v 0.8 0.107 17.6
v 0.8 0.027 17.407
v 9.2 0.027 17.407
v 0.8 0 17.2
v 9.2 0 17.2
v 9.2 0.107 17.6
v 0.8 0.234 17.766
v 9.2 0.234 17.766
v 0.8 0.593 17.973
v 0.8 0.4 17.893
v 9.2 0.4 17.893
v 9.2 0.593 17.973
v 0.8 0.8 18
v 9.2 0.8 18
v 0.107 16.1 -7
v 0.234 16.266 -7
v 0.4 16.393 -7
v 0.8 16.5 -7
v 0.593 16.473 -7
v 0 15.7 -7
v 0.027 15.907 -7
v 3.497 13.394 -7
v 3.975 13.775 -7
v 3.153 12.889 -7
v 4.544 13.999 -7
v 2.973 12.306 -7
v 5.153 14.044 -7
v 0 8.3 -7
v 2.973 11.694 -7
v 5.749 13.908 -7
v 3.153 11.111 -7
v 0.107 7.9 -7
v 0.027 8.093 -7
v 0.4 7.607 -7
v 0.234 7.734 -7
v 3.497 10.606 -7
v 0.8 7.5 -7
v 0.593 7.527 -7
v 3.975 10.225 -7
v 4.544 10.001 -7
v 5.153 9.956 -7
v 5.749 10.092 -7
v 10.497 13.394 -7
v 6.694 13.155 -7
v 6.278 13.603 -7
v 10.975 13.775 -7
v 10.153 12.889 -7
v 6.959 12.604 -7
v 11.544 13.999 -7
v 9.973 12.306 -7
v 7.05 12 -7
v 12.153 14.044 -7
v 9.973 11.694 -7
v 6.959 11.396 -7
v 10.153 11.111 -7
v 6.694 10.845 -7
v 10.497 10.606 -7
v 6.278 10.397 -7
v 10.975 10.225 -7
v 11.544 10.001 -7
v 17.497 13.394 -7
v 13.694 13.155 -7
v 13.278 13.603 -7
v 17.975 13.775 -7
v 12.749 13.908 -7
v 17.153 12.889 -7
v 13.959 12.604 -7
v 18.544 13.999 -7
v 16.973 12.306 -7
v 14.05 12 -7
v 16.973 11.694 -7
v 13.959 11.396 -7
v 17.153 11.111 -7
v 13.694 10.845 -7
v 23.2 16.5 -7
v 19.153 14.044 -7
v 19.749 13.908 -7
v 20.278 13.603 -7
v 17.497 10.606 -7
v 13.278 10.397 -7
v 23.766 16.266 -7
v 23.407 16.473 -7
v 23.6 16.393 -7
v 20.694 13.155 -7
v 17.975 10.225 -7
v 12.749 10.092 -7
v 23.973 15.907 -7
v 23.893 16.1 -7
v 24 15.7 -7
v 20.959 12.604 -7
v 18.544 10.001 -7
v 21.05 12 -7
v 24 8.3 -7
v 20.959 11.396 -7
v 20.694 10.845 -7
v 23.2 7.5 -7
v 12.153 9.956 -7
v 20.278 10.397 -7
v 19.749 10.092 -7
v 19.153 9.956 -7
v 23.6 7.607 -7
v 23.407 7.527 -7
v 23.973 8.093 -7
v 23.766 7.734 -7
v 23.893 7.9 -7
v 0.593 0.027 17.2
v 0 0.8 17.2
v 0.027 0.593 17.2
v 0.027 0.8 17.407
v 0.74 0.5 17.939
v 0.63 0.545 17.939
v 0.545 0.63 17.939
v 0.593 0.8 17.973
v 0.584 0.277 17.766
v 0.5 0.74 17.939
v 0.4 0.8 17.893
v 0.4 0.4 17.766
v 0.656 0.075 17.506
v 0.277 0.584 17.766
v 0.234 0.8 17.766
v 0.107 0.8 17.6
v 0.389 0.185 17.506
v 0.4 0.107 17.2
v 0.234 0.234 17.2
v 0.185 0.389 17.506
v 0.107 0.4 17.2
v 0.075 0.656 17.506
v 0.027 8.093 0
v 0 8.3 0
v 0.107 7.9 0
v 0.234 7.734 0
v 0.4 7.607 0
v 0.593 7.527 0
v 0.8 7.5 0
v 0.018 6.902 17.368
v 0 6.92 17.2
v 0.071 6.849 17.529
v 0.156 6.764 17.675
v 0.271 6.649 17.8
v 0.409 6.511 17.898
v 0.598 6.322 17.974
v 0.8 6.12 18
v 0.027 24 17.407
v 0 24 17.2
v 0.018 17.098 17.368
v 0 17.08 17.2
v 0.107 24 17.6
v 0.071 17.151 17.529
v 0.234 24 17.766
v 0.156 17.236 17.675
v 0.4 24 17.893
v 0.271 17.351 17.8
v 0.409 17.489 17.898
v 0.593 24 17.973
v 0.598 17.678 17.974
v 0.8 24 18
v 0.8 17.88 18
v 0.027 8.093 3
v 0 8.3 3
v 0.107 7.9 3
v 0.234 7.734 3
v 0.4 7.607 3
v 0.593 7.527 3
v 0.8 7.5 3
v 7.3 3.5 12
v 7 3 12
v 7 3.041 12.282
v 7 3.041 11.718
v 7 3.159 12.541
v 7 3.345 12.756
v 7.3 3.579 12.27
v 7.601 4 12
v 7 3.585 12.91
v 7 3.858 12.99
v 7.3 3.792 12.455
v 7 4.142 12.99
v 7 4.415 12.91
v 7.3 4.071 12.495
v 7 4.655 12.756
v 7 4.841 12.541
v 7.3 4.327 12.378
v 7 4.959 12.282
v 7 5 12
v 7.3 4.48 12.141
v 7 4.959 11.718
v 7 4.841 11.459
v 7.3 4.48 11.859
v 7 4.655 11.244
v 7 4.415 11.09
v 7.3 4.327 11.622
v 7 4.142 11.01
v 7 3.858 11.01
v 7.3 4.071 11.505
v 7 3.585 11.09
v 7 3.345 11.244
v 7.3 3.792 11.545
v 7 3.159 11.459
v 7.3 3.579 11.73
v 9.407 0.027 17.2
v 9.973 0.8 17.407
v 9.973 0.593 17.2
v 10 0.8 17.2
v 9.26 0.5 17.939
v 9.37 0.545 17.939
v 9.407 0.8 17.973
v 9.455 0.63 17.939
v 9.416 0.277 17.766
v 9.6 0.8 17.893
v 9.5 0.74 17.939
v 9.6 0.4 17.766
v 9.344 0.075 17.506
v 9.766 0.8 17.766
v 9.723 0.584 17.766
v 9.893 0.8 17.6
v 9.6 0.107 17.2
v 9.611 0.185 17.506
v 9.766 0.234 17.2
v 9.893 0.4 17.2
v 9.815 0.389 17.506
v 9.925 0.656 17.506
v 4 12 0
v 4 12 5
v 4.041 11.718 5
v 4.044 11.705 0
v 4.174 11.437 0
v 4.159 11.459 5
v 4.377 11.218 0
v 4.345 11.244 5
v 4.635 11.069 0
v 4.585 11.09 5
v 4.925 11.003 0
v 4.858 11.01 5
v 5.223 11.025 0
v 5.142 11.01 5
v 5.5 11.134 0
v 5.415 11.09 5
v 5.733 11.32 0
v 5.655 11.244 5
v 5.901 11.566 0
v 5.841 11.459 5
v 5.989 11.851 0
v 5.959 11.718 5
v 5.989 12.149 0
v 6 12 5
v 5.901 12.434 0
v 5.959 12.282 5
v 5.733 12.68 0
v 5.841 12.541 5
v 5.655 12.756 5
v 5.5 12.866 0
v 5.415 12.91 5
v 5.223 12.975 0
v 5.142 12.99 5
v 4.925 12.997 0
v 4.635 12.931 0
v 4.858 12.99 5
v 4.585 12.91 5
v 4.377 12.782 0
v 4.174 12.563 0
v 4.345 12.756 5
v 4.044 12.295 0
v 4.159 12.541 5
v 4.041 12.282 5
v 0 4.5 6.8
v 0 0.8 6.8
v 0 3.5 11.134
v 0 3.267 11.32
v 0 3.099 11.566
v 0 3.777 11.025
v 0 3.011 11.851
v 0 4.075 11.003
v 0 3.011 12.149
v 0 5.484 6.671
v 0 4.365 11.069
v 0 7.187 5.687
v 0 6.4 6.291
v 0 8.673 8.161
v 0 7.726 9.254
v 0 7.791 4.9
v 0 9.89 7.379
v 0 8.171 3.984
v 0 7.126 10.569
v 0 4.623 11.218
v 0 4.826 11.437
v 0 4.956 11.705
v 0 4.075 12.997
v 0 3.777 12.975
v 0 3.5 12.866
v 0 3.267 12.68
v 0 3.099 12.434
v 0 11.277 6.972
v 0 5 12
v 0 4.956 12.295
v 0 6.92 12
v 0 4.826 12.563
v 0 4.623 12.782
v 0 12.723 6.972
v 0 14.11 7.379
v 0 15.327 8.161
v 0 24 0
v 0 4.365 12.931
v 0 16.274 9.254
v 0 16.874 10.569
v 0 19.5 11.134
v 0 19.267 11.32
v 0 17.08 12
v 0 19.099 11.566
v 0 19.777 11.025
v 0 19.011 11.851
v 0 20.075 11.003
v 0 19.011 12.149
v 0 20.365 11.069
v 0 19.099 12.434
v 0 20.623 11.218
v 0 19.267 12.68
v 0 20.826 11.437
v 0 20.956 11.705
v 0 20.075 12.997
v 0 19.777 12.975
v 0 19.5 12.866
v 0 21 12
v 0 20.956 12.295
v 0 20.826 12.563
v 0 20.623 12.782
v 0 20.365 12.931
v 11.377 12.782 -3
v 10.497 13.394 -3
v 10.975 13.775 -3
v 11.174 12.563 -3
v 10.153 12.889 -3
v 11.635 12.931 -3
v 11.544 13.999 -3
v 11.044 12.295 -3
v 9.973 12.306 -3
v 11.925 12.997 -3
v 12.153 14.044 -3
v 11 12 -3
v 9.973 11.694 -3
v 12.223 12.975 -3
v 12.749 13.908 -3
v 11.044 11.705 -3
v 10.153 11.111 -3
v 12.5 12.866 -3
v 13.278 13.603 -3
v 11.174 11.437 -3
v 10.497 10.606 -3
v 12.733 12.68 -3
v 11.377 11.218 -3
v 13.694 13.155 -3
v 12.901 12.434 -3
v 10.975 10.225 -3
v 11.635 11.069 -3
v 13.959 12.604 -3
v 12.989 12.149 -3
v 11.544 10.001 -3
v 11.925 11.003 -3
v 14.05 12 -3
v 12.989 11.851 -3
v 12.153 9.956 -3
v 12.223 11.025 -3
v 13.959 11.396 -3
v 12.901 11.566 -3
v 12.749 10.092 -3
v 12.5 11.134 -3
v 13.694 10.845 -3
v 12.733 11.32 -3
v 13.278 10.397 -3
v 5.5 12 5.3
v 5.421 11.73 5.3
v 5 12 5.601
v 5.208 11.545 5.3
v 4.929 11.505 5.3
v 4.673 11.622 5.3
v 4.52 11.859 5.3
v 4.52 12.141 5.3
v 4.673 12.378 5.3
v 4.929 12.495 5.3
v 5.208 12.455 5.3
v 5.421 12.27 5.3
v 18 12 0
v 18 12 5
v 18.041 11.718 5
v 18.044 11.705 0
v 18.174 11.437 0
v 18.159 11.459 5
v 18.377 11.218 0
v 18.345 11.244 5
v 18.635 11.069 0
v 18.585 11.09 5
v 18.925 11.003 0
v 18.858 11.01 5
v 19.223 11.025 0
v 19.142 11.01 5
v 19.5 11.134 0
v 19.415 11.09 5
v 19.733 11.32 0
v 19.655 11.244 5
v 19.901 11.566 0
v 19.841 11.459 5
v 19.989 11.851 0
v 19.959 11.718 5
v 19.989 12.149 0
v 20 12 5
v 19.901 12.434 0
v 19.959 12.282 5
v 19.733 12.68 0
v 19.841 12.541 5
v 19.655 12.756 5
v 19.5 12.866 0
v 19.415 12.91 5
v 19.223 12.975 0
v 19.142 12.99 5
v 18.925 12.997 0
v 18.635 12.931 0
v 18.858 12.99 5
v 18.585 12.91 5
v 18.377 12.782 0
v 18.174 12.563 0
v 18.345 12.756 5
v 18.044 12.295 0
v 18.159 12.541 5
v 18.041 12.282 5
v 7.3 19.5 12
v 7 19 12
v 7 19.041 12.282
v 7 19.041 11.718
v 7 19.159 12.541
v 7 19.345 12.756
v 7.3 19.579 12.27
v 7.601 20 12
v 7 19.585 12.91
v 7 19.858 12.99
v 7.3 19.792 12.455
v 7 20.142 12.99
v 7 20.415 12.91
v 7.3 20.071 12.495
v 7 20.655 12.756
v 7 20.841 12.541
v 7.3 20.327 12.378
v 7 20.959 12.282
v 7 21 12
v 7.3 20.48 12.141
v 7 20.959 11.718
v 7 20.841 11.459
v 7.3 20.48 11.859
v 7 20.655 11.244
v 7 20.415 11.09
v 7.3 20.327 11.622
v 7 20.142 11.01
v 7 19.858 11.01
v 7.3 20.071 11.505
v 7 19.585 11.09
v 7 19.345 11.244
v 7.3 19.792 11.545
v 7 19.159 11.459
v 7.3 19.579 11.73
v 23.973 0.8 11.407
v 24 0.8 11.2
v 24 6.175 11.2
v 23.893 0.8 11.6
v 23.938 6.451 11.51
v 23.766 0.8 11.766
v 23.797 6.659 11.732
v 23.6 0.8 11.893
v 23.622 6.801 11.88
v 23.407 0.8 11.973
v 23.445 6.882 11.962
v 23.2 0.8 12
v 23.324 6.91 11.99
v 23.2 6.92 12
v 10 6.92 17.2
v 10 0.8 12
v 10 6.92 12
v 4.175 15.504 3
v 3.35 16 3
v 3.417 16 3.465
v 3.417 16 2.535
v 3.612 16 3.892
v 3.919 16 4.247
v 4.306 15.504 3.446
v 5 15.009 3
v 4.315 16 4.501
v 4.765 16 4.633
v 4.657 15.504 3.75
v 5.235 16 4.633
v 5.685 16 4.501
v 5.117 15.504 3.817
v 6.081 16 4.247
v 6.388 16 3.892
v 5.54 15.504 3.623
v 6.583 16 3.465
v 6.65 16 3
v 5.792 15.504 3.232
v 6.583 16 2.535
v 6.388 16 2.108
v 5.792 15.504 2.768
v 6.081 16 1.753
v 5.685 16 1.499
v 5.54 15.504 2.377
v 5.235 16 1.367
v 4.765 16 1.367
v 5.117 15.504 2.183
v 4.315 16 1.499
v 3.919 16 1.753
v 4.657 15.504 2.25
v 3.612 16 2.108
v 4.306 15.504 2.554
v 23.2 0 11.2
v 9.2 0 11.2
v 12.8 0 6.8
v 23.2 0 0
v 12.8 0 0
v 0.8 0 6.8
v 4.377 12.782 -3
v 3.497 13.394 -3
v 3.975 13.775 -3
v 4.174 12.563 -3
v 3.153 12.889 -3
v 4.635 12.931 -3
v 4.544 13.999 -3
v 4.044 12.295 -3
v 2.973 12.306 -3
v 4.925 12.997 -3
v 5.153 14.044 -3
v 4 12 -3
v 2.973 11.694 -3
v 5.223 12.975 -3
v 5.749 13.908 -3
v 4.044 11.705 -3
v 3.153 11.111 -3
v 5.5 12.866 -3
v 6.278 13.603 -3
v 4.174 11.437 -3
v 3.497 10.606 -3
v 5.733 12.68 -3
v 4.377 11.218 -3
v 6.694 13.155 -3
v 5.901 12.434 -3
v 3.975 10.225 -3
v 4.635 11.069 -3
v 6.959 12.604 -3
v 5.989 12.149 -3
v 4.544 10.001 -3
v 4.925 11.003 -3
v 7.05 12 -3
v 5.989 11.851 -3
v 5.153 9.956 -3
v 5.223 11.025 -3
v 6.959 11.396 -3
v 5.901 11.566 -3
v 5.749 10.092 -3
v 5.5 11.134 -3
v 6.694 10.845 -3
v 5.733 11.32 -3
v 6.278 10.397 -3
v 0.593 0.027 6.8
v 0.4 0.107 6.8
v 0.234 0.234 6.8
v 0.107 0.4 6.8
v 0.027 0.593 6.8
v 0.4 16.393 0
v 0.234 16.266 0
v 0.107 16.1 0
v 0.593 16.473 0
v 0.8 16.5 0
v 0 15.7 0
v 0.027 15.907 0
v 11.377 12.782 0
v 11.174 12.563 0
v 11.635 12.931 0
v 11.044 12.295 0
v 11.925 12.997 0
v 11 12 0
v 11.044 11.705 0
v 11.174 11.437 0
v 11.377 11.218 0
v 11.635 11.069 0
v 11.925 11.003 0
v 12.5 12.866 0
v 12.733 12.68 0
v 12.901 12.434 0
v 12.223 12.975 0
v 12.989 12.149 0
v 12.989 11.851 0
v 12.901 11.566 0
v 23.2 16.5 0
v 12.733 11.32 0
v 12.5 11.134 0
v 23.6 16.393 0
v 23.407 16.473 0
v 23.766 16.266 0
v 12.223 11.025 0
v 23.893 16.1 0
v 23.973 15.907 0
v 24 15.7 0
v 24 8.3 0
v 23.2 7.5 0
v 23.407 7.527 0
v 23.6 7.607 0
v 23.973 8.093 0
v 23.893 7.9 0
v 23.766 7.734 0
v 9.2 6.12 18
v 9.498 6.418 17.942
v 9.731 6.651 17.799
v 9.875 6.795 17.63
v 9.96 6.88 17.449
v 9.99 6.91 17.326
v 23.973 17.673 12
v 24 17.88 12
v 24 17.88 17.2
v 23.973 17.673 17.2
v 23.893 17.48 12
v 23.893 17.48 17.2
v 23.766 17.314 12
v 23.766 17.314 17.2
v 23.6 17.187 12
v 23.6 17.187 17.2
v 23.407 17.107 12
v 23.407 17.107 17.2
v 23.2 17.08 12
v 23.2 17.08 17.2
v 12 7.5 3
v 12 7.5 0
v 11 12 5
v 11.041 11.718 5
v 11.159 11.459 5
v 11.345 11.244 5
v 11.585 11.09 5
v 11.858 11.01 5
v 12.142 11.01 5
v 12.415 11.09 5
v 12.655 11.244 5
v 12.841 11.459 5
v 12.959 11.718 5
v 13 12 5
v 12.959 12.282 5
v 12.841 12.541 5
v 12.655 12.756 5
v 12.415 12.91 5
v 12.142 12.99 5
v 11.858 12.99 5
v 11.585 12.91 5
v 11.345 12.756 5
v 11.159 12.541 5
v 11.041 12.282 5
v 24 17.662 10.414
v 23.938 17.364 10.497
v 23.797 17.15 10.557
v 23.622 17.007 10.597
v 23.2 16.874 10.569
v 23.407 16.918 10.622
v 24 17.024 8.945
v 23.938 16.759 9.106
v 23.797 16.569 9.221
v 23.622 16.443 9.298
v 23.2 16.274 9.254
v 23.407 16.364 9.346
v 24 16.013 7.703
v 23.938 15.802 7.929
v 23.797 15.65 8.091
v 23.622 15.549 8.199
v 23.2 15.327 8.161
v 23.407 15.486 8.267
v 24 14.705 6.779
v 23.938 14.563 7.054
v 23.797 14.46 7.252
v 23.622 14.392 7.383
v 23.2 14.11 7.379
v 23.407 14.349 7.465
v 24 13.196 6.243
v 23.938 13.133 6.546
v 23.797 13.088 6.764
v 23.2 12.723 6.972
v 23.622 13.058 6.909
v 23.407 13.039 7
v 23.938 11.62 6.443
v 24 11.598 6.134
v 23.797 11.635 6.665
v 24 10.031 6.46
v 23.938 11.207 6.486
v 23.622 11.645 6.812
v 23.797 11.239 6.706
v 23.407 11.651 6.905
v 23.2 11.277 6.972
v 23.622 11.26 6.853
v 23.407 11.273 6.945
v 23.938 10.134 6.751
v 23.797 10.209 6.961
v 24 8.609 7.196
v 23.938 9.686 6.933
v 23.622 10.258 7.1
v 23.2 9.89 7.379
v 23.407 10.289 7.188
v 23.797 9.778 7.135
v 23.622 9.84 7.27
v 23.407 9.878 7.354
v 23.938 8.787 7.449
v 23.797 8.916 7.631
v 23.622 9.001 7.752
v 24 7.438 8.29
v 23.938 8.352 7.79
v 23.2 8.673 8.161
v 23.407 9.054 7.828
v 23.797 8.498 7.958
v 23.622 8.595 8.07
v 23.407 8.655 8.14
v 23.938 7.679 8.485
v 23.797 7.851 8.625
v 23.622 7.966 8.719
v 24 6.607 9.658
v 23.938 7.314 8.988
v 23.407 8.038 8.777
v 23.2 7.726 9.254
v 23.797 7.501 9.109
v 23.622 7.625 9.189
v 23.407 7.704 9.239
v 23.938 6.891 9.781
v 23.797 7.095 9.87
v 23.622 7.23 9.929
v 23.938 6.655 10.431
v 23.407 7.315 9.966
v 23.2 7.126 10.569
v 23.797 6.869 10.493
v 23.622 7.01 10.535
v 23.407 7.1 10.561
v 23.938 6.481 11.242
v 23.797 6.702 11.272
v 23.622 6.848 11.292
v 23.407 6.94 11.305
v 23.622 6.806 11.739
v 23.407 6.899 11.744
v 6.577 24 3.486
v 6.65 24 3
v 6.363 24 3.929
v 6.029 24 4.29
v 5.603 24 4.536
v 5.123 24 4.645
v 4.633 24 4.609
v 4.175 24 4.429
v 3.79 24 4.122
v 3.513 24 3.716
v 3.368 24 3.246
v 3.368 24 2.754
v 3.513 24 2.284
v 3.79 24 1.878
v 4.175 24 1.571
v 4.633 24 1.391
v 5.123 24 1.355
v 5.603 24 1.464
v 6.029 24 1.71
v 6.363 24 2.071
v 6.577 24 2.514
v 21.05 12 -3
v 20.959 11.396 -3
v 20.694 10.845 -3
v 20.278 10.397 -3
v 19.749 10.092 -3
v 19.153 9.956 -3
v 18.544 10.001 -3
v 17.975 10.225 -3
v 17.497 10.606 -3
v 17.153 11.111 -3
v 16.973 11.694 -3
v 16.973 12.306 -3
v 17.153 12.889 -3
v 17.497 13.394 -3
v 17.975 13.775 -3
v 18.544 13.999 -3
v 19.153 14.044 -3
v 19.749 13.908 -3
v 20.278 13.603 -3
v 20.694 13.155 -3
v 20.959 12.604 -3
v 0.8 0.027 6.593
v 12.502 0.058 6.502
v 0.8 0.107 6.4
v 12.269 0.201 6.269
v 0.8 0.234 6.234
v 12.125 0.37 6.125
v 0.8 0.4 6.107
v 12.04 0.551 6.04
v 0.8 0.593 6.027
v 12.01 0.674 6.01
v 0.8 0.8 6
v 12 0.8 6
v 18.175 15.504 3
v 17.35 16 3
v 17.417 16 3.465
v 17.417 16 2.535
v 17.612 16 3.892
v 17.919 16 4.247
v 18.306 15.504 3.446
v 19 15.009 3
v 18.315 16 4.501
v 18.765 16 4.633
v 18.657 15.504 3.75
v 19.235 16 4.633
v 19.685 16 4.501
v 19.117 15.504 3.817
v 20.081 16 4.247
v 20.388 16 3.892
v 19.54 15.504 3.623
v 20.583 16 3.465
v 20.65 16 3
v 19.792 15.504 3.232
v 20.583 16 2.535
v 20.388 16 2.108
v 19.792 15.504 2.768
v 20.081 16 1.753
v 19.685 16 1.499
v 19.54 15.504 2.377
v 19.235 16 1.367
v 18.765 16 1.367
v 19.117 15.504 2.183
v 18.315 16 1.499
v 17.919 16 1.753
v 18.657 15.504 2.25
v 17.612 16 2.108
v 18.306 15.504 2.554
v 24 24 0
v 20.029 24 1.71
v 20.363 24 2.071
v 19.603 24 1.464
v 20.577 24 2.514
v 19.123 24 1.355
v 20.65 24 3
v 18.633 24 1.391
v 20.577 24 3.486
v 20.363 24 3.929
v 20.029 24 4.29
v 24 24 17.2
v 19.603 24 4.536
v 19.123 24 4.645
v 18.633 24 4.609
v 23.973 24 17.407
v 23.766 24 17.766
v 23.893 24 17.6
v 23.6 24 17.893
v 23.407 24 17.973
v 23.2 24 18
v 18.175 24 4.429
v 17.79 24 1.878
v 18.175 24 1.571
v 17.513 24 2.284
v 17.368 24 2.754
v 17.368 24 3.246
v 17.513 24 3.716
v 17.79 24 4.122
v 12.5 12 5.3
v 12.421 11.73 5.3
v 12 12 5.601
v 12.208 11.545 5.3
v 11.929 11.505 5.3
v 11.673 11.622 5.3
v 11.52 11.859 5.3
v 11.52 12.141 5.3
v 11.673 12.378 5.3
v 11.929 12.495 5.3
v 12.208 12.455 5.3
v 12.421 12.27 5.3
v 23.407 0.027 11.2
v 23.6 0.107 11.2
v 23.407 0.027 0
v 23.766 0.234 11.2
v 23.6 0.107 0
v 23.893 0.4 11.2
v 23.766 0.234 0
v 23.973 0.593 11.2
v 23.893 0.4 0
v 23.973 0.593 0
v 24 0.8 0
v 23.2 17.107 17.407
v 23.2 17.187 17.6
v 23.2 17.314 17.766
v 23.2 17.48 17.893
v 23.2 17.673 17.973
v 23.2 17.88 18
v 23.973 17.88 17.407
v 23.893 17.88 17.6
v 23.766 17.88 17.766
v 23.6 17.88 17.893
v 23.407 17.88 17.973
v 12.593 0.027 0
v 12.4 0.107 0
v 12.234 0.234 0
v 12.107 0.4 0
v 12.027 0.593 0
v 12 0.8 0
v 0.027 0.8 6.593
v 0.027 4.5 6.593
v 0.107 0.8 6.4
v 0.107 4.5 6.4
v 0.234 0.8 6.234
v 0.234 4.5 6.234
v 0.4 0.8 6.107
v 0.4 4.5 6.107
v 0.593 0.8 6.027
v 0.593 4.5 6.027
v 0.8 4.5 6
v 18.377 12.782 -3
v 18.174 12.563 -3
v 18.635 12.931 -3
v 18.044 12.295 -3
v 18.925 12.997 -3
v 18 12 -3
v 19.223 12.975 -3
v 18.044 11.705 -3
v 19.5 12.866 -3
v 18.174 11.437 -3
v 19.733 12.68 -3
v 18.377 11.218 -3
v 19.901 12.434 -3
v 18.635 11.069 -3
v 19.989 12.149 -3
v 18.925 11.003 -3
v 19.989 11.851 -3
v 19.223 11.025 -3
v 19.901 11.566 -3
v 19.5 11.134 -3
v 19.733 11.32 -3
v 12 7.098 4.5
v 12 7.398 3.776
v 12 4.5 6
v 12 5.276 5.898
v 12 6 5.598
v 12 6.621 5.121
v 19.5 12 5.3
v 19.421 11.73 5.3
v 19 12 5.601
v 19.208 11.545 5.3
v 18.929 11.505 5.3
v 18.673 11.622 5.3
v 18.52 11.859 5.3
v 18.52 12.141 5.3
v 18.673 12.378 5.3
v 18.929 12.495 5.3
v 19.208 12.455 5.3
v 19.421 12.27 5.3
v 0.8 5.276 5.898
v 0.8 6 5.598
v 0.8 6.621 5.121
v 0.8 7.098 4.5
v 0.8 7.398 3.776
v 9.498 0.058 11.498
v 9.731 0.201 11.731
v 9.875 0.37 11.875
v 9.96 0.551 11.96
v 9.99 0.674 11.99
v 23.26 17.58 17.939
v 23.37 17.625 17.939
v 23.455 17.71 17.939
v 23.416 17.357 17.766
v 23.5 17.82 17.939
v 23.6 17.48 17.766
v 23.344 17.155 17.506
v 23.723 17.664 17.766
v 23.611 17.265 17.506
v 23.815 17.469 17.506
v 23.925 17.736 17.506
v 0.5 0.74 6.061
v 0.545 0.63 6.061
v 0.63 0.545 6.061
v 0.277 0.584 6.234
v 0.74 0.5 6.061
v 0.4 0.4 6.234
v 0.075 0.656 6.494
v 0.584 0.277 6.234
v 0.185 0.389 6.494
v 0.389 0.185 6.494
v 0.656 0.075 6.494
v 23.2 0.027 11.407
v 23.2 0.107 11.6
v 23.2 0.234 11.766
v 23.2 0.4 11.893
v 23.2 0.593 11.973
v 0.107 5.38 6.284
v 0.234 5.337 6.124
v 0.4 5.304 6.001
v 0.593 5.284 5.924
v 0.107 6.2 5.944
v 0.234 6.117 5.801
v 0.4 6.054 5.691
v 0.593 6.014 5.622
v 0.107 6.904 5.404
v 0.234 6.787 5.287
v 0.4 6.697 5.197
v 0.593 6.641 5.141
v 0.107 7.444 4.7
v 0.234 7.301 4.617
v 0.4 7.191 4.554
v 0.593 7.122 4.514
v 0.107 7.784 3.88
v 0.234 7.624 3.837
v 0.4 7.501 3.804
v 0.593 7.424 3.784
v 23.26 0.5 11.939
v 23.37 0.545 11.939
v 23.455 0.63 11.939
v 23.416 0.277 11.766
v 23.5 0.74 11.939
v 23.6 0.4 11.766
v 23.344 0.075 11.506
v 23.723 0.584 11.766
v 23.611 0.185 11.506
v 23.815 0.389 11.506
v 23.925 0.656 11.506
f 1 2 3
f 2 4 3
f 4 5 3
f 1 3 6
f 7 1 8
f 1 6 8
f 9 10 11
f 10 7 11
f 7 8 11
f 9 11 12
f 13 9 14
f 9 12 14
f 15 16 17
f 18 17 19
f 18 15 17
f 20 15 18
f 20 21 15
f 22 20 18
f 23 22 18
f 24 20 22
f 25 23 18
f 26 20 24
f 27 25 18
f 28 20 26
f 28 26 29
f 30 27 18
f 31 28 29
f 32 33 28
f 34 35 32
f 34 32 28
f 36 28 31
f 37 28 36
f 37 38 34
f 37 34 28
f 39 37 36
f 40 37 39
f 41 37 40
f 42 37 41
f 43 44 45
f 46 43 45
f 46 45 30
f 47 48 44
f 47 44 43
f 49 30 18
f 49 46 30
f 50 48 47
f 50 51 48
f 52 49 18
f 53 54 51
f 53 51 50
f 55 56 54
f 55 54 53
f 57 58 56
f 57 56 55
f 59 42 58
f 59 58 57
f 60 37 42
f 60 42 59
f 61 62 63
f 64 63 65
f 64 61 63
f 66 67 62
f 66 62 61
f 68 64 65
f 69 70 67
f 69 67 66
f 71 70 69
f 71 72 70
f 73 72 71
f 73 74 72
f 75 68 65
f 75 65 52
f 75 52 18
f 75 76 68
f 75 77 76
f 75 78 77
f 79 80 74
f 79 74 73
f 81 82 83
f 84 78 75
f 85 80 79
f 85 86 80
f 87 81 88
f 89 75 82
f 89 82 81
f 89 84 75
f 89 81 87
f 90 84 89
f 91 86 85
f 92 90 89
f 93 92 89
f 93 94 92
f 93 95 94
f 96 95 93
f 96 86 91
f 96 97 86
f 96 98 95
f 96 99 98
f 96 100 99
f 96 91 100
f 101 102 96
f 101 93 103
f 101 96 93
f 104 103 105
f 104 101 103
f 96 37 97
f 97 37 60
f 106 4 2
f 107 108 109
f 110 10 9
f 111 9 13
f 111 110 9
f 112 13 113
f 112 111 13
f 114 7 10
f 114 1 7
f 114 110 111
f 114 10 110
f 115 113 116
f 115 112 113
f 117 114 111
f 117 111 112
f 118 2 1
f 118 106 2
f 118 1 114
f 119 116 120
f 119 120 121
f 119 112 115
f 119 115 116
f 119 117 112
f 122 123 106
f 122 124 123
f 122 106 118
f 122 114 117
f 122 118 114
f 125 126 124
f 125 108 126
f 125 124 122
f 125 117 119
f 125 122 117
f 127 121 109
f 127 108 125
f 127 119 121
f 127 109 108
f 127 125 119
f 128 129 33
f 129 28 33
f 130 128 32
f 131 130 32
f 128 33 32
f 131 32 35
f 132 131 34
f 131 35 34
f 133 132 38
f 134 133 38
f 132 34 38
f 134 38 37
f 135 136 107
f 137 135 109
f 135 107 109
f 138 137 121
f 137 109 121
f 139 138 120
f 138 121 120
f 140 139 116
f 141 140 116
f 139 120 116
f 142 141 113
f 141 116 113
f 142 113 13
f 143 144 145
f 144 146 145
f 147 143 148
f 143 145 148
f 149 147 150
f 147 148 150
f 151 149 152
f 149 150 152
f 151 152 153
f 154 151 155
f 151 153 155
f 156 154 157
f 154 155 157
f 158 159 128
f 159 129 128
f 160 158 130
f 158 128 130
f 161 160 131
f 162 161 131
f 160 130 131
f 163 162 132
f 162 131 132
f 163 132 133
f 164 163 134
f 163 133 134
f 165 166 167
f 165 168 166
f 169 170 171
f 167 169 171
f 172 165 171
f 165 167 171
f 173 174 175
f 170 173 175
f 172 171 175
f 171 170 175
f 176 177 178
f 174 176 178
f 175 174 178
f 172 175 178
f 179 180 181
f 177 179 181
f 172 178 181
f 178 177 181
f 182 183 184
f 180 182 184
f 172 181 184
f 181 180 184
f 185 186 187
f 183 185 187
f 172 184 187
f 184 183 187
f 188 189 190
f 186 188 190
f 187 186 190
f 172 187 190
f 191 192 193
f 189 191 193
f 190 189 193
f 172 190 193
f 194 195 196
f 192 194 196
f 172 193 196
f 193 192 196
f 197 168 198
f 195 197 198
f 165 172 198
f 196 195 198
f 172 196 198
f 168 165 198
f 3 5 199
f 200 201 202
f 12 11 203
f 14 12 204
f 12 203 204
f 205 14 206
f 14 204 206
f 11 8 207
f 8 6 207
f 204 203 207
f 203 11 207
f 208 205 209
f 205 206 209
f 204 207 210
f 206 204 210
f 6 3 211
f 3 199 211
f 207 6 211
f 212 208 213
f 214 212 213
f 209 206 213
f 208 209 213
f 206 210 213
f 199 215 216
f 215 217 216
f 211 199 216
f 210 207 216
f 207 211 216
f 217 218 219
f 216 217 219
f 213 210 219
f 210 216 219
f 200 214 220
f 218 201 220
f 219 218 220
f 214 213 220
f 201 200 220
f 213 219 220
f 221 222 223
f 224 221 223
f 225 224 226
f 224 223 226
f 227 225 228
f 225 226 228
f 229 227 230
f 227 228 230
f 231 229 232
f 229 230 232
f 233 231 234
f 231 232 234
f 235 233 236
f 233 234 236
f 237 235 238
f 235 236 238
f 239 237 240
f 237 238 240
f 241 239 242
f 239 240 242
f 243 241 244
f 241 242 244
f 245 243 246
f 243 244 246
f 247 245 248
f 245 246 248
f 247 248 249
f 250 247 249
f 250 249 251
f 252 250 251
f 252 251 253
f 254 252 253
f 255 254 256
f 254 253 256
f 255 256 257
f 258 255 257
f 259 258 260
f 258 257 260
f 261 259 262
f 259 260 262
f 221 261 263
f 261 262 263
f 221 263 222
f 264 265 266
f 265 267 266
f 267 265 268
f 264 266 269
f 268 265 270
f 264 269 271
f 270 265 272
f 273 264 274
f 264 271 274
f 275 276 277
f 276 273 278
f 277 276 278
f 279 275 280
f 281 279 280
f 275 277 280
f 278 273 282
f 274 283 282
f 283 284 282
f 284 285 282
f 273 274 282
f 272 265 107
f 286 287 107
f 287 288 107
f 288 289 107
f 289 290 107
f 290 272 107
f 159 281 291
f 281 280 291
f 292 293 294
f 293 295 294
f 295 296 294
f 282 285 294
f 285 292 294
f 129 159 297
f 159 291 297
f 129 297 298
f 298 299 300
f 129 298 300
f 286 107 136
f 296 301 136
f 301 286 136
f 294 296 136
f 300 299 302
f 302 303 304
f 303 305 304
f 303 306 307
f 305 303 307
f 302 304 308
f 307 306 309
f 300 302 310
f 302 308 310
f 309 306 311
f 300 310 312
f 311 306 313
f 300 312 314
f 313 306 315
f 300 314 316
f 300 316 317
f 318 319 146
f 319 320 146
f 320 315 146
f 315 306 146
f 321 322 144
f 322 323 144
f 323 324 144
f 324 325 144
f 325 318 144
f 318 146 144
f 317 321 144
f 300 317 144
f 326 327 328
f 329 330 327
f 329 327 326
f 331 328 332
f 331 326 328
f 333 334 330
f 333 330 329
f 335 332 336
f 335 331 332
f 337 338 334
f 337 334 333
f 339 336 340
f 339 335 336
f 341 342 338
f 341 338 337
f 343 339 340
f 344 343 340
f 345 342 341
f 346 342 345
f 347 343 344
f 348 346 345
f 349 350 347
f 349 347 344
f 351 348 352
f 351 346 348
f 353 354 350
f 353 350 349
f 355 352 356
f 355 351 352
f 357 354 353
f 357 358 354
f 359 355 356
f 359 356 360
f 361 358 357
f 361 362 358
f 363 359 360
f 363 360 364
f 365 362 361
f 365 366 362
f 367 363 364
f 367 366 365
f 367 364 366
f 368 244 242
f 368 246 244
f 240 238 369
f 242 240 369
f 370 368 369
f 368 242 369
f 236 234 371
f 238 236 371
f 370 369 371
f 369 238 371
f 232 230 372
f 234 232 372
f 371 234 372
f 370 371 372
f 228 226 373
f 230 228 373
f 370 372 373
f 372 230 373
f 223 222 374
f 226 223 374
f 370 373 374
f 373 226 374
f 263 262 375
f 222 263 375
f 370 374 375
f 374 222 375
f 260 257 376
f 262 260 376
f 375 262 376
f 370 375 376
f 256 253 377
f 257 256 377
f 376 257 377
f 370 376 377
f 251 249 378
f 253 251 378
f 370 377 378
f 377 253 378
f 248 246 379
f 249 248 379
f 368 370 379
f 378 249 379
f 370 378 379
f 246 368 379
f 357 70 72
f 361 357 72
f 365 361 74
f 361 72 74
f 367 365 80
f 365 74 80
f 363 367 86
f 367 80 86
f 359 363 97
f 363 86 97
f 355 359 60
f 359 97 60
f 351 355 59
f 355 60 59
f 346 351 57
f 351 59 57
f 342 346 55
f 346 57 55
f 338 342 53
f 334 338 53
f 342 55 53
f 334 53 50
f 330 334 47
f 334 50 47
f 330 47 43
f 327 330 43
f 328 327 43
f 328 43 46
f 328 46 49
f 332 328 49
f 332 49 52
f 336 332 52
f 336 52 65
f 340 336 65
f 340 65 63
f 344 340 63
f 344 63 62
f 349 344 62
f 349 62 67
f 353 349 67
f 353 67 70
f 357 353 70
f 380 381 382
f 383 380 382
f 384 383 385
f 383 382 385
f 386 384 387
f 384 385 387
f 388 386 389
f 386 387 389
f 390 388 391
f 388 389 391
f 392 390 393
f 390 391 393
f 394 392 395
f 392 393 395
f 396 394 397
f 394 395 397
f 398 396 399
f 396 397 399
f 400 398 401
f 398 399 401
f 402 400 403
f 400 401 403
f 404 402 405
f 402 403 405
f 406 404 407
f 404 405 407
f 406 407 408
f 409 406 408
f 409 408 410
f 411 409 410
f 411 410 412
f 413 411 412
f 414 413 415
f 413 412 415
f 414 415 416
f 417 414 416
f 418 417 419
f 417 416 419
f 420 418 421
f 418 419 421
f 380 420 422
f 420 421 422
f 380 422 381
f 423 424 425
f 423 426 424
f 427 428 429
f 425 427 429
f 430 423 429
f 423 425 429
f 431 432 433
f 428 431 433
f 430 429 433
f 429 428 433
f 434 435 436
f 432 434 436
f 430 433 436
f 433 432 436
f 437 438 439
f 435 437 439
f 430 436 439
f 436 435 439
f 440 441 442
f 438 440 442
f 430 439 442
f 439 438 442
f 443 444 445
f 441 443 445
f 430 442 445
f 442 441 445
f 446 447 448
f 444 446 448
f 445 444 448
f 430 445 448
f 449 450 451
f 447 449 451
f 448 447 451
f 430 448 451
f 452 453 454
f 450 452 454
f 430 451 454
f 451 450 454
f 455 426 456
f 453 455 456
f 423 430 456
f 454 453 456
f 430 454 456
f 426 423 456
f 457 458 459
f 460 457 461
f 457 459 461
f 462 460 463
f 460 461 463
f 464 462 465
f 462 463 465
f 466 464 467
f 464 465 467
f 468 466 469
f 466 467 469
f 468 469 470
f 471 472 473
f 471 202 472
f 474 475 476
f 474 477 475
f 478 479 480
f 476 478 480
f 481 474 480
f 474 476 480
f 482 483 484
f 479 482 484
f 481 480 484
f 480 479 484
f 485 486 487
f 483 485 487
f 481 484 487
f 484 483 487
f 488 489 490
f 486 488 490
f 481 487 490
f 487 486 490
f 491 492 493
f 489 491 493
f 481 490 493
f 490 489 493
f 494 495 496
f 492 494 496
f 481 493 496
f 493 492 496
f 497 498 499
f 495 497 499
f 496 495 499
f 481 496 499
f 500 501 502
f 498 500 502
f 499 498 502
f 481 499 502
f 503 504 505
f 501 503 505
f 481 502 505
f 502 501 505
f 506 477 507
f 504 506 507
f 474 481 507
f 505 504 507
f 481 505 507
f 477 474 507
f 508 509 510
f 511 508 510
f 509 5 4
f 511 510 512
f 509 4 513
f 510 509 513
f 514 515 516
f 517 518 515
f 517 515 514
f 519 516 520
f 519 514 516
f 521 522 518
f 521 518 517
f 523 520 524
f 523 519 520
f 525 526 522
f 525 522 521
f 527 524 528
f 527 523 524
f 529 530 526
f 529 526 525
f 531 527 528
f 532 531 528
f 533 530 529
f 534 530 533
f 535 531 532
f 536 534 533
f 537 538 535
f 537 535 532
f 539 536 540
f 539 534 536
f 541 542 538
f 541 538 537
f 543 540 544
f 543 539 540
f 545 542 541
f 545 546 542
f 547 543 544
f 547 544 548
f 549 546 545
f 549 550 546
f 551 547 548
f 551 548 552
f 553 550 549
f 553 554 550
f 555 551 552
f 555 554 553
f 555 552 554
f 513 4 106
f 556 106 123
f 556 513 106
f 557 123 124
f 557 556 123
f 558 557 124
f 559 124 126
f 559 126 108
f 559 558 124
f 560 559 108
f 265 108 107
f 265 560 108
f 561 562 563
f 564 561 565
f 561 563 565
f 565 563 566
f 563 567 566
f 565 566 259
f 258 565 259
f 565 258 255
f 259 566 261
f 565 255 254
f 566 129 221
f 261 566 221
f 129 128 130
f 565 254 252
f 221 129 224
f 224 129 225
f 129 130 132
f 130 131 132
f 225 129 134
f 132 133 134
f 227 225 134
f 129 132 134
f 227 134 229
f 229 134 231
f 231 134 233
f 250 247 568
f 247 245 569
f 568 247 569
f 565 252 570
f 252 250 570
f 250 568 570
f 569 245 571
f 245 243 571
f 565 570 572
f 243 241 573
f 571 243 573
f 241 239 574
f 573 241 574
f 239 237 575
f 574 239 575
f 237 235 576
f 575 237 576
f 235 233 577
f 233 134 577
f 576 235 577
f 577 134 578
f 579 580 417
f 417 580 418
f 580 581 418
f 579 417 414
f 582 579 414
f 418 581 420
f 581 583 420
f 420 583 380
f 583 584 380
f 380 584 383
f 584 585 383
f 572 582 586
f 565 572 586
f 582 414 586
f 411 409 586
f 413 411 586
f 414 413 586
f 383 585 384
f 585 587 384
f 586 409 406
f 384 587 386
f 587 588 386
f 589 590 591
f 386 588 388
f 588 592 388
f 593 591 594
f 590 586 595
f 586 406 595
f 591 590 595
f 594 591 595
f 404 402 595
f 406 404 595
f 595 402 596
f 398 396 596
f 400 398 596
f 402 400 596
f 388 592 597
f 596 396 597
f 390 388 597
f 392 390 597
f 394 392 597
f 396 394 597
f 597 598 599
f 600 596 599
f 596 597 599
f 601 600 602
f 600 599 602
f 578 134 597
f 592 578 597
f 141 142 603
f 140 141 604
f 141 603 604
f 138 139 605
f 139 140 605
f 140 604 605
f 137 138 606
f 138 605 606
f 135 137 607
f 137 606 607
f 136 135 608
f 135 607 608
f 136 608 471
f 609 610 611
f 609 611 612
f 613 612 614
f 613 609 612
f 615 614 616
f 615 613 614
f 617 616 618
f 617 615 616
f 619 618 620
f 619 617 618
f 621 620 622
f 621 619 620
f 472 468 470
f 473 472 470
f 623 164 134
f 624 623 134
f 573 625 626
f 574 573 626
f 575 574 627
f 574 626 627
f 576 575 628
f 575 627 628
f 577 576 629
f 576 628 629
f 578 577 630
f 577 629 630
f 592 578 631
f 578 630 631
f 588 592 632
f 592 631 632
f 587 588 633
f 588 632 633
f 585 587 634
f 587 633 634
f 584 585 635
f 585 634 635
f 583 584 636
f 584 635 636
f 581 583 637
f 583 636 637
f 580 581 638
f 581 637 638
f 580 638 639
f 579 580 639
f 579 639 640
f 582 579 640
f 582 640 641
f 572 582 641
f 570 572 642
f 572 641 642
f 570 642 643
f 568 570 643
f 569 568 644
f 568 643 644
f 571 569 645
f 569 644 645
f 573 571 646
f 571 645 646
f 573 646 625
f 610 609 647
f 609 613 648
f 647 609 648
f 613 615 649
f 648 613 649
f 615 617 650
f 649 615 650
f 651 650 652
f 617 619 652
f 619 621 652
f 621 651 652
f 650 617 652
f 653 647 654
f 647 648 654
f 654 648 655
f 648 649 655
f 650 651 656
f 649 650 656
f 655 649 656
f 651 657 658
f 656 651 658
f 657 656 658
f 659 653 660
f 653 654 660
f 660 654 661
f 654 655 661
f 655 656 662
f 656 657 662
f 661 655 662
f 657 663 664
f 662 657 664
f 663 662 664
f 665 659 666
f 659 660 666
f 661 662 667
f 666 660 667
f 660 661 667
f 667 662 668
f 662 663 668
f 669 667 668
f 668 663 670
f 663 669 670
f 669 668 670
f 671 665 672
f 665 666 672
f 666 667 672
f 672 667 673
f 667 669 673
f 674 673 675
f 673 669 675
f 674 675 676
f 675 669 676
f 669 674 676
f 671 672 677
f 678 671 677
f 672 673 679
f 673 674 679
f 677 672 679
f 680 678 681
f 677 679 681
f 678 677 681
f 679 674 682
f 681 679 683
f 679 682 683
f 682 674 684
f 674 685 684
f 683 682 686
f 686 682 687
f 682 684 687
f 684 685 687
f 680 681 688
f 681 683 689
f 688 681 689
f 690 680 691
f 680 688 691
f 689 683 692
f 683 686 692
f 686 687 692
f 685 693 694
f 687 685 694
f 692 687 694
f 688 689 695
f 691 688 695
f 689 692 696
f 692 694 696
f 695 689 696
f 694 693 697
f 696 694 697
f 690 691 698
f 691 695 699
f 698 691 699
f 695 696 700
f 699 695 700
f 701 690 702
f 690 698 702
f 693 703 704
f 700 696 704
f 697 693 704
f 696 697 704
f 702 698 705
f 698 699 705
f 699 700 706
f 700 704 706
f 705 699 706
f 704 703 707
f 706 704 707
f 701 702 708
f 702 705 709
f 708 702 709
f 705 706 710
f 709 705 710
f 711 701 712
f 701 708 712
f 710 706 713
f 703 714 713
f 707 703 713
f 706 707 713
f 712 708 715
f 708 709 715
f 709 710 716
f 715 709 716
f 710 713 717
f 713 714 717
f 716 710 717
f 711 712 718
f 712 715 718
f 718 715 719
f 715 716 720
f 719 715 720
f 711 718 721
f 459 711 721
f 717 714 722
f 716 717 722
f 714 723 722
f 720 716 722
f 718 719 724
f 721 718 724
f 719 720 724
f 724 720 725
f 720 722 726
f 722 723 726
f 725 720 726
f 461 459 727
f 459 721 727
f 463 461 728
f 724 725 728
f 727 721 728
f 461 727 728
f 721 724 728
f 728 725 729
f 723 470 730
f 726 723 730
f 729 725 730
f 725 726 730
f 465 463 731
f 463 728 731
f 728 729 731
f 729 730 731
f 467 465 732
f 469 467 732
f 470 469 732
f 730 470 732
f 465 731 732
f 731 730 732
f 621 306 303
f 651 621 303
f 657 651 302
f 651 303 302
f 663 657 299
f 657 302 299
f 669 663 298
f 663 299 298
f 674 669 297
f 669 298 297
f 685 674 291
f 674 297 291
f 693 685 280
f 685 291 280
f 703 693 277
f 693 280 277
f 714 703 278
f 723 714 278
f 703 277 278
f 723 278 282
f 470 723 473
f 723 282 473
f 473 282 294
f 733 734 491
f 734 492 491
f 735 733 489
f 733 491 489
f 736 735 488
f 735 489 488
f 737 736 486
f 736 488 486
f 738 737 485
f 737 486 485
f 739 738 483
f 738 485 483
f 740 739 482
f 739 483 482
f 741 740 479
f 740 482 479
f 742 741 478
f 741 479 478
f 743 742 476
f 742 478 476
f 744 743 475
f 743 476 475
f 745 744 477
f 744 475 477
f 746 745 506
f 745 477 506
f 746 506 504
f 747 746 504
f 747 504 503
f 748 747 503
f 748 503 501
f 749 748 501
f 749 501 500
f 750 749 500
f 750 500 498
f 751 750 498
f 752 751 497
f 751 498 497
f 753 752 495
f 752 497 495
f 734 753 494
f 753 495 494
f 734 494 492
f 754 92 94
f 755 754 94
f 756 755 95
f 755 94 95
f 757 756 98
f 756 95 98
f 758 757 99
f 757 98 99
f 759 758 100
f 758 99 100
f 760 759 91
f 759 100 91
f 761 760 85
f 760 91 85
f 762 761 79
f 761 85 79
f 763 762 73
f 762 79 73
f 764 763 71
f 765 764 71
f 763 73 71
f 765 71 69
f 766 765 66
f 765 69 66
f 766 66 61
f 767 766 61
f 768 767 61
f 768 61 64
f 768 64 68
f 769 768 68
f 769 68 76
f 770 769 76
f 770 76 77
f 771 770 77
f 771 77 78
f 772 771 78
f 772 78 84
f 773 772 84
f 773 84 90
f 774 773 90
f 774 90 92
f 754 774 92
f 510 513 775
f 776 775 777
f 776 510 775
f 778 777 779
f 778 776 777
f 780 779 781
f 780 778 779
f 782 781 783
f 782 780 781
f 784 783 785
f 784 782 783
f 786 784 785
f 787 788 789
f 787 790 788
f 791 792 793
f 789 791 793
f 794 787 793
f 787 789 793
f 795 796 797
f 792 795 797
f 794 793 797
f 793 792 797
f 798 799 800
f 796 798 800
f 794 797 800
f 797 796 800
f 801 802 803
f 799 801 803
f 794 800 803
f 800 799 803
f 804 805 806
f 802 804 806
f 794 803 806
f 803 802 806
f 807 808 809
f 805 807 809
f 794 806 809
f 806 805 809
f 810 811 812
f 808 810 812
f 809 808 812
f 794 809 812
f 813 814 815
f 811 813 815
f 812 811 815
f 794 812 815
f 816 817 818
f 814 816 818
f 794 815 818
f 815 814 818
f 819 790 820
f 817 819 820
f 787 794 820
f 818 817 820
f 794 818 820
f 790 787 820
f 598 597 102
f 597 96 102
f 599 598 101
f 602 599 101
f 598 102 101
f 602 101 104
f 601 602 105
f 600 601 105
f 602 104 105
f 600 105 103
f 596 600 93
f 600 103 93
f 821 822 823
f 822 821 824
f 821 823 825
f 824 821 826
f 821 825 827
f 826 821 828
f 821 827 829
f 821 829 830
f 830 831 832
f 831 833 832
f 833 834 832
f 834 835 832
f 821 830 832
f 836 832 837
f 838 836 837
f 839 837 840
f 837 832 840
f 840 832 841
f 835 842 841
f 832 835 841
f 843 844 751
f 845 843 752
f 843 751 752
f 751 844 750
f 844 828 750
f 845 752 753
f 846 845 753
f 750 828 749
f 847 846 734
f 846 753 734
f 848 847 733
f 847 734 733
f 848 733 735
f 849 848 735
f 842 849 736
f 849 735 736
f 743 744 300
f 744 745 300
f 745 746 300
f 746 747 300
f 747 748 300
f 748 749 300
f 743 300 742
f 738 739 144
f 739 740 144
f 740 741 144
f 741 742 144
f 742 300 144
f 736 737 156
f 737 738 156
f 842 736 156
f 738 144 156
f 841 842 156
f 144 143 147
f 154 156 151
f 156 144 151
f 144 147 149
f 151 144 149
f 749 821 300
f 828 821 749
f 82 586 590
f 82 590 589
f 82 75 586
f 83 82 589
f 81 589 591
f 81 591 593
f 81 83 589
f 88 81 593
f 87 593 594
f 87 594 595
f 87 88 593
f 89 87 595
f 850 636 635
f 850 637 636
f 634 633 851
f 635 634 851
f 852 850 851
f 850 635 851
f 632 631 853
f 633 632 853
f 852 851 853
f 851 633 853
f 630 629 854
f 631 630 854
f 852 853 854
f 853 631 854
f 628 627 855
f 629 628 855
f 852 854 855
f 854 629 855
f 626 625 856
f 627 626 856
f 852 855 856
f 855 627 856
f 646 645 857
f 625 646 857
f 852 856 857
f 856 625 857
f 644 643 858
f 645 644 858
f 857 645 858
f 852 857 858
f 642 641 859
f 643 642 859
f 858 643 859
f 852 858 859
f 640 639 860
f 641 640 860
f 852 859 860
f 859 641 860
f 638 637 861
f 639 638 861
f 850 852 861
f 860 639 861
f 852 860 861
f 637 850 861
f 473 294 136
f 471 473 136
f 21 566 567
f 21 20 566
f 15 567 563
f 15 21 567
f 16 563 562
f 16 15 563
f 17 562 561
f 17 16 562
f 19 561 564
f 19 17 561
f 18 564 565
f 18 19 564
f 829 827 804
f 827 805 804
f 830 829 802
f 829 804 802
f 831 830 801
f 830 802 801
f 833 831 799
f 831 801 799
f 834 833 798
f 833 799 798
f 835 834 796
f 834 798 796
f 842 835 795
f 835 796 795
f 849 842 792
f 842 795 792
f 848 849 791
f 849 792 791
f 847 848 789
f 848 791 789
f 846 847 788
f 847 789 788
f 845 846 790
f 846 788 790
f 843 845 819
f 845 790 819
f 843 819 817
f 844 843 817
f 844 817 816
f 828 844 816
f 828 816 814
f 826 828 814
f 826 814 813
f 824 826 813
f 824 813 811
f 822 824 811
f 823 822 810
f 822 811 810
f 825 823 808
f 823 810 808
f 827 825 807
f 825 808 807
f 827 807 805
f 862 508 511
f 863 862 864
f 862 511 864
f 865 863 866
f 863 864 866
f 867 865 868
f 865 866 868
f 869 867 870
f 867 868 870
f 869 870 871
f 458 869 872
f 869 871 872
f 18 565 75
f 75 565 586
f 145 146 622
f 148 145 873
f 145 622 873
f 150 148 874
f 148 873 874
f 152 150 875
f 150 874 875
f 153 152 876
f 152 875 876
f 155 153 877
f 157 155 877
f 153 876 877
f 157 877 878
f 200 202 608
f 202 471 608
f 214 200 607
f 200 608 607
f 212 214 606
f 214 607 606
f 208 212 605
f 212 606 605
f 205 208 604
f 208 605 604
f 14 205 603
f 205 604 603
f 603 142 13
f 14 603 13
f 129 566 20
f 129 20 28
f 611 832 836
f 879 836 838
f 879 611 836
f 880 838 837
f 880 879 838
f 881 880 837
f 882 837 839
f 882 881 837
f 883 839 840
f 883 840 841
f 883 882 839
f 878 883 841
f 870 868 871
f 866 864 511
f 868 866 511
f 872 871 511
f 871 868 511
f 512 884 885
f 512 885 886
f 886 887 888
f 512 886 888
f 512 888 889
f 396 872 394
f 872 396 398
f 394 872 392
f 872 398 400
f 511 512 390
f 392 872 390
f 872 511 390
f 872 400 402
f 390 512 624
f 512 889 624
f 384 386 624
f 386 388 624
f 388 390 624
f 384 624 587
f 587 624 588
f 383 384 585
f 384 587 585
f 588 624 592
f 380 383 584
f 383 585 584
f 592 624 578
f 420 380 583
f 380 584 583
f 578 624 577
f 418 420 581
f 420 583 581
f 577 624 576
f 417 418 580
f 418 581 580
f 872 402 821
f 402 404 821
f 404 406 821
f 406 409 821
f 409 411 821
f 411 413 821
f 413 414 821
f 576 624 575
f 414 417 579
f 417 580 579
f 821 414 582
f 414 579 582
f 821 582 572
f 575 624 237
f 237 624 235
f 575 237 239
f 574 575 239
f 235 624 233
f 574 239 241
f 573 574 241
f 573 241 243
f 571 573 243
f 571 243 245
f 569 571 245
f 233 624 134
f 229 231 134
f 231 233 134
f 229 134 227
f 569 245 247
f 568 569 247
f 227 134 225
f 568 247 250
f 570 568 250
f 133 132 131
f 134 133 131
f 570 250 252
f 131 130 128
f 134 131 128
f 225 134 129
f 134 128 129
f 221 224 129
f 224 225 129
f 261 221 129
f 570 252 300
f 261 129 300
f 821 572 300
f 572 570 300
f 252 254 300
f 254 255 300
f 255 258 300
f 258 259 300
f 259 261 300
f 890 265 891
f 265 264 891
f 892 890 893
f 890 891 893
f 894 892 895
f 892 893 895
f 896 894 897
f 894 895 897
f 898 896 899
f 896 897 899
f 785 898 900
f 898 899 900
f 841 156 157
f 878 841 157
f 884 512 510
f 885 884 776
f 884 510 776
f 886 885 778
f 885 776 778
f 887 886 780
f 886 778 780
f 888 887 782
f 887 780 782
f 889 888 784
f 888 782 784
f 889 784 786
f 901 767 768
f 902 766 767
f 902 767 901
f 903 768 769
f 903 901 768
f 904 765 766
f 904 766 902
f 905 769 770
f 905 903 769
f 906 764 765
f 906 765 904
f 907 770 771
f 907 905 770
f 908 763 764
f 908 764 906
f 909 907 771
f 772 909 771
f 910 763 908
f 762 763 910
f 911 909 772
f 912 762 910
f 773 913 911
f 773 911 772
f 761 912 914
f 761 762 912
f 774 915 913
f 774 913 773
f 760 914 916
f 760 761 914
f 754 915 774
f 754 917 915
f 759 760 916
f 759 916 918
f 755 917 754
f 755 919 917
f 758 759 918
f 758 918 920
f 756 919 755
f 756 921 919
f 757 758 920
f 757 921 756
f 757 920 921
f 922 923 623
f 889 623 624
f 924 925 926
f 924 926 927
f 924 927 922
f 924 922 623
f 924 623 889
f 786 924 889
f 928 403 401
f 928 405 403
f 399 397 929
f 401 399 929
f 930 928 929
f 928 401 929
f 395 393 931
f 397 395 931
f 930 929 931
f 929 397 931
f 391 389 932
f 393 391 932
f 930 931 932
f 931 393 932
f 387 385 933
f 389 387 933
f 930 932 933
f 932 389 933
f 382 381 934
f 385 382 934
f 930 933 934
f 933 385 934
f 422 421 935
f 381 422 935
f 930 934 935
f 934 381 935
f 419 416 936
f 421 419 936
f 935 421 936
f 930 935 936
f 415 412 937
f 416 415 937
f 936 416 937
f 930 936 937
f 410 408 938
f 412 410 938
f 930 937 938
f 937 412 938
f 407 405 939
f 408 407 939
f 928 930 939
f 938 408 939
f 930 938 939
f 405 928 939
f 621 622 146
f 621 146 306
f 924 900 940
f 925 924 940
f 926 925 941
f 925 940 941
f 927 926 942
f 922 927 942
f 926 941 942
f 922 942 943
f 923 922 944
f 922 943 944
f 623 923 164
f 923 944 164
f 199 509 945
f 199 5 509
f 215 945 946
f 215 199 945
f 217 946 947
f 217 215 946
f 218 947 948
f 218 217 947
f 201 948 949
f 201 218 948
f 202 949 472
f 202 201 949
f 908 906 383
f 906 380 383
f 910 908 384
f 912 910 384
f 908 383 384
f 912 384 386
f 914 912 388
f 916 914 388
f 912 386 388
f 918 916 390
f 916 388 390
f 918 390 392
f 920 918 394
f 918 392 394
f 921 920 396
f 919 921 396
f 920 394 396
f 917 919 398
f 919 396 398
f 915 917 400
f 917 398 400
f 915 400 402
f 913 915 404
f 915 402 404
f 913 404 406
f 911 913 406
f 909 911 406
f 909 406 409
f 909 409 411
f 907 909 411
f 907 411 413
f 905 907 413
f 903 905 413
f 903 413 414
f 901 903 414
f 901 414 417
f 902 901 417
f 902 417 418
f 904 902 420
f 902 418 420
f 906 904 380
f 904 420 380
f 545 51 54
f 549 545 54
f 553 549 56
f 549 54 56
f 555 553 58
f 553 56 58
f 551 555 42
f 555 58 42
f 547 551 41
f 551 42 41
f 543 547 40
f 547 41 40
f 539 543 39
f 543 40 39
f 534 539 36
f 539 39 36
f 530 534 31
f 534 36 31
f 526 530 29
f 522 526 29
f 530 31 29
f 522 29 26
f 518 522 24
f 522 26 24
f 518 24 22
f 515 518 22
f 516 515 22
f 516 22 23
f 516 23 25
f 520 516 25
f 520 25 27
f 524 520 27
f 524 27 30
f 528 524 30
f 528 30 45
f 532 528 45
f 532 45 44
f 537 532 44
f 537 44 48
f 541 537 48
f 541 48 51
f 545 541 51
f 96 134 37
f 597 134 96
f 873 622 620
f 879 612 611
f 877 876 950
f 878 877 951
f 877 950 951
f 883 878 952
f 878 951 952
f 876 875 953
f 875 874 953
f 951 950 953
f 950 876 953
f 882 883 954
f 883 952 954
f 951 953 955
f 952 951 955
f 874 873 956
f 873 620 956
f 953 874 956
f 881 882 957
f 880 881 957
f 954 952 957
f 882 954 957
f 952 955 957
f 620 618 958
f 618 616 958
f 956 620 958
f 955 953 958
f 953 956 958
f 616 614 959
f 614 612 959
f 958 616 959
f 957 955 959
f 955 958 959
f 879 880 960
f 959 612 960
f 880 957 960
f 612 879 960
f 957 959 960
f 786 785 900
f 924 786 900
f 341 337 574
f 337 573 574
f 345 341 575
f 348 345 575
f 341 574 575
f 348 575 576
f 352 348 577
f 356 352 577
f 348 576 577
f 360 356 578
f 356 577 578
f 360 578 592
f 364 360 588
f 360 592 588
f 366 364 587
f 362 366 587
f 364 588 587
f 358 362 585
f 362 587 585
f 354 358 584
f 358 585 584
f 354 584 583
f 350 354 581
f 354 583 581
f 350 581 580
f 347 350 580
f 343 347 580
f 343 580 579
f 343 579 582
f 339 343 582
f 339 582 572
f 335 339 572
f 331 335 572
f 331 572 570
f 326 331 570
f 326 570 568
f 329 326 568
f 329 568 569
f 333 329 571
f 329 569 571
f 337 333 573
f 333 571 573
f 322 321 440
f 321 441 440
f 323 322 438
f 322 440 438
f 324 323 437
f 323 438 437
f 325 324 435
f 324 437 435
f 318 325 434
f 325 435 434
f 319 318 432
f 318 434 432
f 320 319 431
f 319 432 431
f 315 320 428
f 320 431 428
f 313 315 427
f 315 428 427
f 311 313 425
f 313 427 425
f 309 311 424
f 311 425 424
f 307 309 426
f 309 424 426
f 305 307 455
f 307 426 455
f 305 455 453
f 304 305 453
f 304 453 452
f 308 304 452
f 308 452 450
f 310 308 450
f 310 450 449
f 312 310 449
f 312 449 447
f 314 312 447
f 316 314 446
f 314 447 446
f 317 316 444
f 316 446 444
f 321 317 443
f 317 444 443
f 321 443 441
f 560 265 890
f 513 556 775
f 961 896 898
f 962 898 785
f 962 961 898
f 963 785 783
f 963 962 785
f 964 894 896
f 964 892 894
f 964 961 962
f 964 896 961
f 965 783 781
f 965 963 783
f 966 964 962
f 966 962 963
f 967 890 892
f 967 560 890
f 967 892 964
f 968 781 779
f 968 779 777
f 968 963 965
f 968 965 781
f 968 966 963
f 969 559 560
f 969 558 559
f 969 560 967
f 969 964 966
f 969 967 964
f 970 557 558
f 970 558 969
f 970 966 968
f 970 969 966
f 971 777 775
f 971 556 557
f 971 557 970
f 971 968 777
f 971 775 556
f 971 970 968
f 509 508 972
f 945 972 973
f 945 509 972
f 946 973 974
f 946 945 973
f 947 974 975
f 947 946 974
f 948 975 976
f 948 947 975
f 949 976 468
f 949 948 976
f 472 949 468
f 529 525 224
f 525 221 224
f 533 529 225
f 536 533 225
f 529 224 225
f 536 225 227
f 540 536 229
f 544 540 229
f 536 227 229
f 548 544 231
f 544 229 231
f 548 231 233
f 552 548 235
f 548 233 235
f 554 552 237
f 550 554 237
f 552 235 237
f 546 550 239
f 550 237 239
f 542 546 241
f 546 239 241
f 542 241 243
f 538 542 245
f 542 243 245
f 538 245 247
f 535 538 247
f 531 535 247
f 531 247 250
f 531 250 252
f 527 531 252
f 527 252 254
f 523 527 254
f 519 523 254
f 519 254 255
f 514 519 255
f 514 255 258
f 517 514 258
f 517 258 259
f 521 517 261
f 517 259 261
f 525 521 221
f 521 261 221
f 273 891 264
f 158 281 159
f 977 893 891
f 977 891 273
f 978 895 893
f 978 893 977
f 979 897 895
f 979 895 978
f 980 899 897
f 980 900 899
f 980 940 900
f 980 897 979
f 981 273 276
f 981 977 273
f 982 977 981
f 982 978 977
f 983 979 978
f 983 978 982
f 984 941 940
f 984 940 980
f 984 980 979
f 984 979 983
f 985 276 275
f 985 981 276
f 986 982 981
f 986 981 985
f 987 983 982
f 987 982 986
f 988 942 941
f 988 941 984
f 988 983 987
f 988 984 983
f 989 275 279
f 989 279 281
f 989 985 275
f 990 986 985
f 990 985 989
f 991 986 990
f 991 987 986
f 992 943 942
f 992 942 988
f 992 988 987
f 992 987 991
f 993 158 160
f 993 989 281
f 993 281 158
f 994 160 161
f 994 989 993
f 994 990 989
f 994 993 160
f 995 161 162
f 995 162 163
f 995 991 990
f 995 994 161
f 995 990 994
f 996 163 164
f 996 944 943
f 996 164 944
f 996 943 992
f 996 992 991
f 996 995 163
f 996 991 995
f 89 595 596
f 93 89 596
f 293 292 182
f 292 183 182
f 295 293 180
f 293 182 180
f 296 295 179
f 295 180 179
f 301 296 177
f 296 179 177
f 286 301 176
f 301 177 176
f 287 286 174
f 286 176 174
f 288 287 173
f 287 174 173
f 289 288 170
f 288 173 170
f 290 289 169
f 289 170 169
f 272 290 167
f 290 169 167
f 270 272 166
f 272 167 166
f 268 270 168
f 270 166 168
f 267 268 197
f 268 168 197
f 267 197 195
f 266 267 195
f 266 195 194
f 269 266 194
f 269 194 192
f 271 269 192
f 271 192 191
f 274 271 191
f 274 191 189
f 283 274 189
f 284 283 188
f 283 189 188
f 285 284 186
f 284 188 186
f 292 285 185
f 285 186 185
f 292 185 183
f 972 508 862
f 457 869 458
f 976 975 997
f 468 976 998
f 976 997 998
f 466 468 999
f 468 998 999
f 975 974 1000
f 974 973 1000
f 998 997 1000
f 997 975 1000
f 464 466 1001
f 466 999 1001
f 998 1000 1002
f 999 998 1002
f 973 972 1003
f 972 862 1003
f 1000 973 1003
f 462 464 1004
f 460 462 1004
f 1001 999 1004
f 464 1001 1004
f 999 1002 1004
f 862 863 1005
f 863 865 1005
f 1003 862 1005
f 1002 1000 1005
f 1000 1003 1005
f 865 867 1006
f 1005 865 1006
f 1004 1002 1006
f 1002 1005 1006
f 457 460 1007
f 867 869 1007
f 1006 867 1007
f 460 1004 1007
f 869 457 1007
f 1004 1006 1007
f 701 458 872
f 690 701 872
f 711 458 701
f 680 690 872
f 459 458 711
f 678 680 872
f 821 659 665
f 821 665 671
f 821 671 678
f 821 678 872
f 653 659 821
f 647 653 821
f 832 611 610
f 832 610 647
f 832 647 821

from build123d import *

# Parameters (mm, degrees)
F1_DEPTH         = 24
F3_D             = 2
F3_DEPTH         = 7
F3_TIP           = 0.600860619
F5_D             = 3.3
F5_DEPTH         = 8
F5_TIP           = 0.9914200214
F6_W             = 24
F6_H             = 9
F7_DEPTH         = 7
F9_D             = 2
F9_DEPTH         = 12
F9_CBORE_D       = 4.1
F9_CBORE_DEPTH   = 4
F9_TIP           = 0.600860619
F9_2_D           = 2
F9_2_DEPTH       = 12
F9_2_CBORE_D     = 4.1
F9_2_CBORE_DEPTH = 4
F9_2_TIP         = 0.600860619
F11_DEPTH        = 12
F12_W            = 6.92
F12_H            = 6
F13_DEPTH        = 14
F14_R            = 0.8
F14_2_R          = 0.8


with BuildPart() as f1:
    # F0 (on Right) → F1 (new body)
    with BuildSketch(Plane.YZ):
        with BuildLine():
            Line((0, 18), (0, 0))
            Line((0, 0), (24, 0))
            Line((24, 0), (24, 18))
            Line((24, 18), (17.08, 18))
            Line((17.08, 18), (17.08, 12))
            ThreePointArc((17.08, 12), (12, 6.92), (6.92, 12))
            Line((6.92, 12), (6.92, 18))
            Line((6.92, 18), (0, 18))
        make_face()
    extrude(amount=F1_DEPTH)

    # F3
    with Locations(Plane(origin=(0, 0, 0), x_dir=(0, -1, 0), z_dir=(-1, 0, 0))):
        with Locations((-20, 12), (-4, 12)):
            Hole(F3_D / 2, depth=F3_DEPTH)
            with Locations((0, 0, -(F3_DEPTH + F3_TIP / 2))):  # 118° drill point
                Cone(0, F3_D / 2, F3_TIP, mode=Mode.SUBTRACT)

    # F5
    with Locations(Plane(origin=(0, 24, 0), x_dir=(-1, 0, 0), z_dir=(0, 1, 0))):
        with Locations((-19, 3), (-5, 3)):
            Hole(F5_D / 2, depth=F5_DEPTH)
            with Locations((0, 0, -(F5_DEPTH + F5_TIP / 2))):  # 118° drill point
                Cone(0, F5_D / 2, F5_TIP, mode=Mode.SUBTRACT)

    # F9
    with Locations(Plane(origin=(0, 0, -7), x_dir=(1, 0, 0), z_dir=(0, 0, -1))):
        with Locations((5, -12), (12, -12), (19, -12)):
            CounterBoreHole(F9_D / 2, F9_CBORE_D / 2, F9_CBORE_DEPTH, depth=F9_DEPTH)
            with Locations((0, 0, -(F9_DEPTH + F9_TIP / 2))):  # 118° drill point
                Cone(0, F9_D / 2, F9_TIP, mode=Mode.SUBTRACT)

    # F10 (on face) → F11 (cut)
    with BuildSketch(Plane(origin=(0, 0, 0), x_dir=(0, -1, 0), z_dir=(-1, 0, 0))):
        with BuildLine():
            ThreePointArc((-4.5, 0), (-2.3786796564, 0.8786796564), (-1.5, 3))
            ThreePointArc((-1.5, 3), (-2.3786796564, 5.1213203436), (-4.5, 6))
            ThreePointArc((-4.5, 6), (-6.6213203436, 5.1213203436), (-7.5, 3))
            ThreePointArc((-7.5, 3), (-6.6213203436, 0.8786796564), (-4.5, 0))
        make_face()
        with BuildLine():
            ThreePointArc((-4.5, 6), (-2.3786796564, 5.1213203436), (-1.5, 3))
            ThreePointArc((-1.5, 3), (-2.3786796564, 0.8786796564), (-4.5, 0))
            Line((-4.5, 0), (0, 0))
            Line((0, 0), (0, 6))
            Line((0, 6), (-4.5, 6))
        make_face()
        with BuildLine():
            Line((-7.5, 0), (-4.5, 0))
            ThreePointArc((-4.5, 0), (-6.6213203436, 0.8786796564), (-7.5, 3))
            Line((-7.5, 3), (-7.5, 0))
        make_face()
    extrude(amount=-F11_DEPTH, mode=Mode.SUBTRACT)

    # F12 (on face) → F13 (cut)
    with BuildSketch(Plane.YZ.offset(24)):
        with Locations((3.46, 15)):
            Rectangle(F12_W, F12_H)
    extrude(amount=-F13_DEPTH, mode=Mode.SUBTRACT)

    # F14
    f14_edges = [f1.edges().sort_by_distance(p)[0] for p in [
        (0, 0, 12),
        (0, 2.25, 6),
        (6, 0, 6),
        (12, 0, 3),
        (24, 0, 6),
        (17, 0, 12),
        (24, 3.46, 12),
        (10, 0, 15),
        (24, 12, 6.92),
        (5, 0, 18),
        (0, 3.46, 18),
        (5, 6.92, 18),
        (10, 3.46, 18),
        (12, 17.08, 18),
        (0, 20.54, 18),
        (24, 20.54, 18),
    ]]
    fillet(f14_edges, radius=F14_R)


with BuildPart() as f7:
    # F6 (on face) → F7 (new body)
    with BuildSketch(Plane(origin=(0, 0, 0), x_dir=(1, 0, 0), z_dir=(0, 0, -1))):
        with Locations((12, -12)):
            Rectangle(F6_W, F6_H)
    extrude(amount=F7_DEPTH)

    # F9#2
    with Locations(Plane(origin=(0, 0, -7), x_dir=(1, 0, 0), z_dir=(0, 0, -1))):
        with Locations((5, -12), (12, -12), (19, -12)):
            CounterBoreHole(F9_2_D / 2, F9_2_CBORE_D / 2, F9_2_CBORE_DEPTH, depth=F9_2_DEPTH)
            with Locations((0, 0, -(F9_2_DEPTH + F9_2_TIP / 2))):  # 118° drill point
                Cone(0, F9_2_D / 2, F9_2_TIP, mode=Mode.SUBTRACT)

    # F14#2
    f14_2_edges = [f7.edges().sort_by_distance(p)[0] for p in [
        (0, 7.5, -3.5),
        (0, 16.5, -3.5),
        (24, 16.5, -3.5),
        (24, 7.5, -3.5),
    ]]
    fillet(f14_2_edges, radius=F14_2_R)


solid = Compound([f1.part, f7.part])
